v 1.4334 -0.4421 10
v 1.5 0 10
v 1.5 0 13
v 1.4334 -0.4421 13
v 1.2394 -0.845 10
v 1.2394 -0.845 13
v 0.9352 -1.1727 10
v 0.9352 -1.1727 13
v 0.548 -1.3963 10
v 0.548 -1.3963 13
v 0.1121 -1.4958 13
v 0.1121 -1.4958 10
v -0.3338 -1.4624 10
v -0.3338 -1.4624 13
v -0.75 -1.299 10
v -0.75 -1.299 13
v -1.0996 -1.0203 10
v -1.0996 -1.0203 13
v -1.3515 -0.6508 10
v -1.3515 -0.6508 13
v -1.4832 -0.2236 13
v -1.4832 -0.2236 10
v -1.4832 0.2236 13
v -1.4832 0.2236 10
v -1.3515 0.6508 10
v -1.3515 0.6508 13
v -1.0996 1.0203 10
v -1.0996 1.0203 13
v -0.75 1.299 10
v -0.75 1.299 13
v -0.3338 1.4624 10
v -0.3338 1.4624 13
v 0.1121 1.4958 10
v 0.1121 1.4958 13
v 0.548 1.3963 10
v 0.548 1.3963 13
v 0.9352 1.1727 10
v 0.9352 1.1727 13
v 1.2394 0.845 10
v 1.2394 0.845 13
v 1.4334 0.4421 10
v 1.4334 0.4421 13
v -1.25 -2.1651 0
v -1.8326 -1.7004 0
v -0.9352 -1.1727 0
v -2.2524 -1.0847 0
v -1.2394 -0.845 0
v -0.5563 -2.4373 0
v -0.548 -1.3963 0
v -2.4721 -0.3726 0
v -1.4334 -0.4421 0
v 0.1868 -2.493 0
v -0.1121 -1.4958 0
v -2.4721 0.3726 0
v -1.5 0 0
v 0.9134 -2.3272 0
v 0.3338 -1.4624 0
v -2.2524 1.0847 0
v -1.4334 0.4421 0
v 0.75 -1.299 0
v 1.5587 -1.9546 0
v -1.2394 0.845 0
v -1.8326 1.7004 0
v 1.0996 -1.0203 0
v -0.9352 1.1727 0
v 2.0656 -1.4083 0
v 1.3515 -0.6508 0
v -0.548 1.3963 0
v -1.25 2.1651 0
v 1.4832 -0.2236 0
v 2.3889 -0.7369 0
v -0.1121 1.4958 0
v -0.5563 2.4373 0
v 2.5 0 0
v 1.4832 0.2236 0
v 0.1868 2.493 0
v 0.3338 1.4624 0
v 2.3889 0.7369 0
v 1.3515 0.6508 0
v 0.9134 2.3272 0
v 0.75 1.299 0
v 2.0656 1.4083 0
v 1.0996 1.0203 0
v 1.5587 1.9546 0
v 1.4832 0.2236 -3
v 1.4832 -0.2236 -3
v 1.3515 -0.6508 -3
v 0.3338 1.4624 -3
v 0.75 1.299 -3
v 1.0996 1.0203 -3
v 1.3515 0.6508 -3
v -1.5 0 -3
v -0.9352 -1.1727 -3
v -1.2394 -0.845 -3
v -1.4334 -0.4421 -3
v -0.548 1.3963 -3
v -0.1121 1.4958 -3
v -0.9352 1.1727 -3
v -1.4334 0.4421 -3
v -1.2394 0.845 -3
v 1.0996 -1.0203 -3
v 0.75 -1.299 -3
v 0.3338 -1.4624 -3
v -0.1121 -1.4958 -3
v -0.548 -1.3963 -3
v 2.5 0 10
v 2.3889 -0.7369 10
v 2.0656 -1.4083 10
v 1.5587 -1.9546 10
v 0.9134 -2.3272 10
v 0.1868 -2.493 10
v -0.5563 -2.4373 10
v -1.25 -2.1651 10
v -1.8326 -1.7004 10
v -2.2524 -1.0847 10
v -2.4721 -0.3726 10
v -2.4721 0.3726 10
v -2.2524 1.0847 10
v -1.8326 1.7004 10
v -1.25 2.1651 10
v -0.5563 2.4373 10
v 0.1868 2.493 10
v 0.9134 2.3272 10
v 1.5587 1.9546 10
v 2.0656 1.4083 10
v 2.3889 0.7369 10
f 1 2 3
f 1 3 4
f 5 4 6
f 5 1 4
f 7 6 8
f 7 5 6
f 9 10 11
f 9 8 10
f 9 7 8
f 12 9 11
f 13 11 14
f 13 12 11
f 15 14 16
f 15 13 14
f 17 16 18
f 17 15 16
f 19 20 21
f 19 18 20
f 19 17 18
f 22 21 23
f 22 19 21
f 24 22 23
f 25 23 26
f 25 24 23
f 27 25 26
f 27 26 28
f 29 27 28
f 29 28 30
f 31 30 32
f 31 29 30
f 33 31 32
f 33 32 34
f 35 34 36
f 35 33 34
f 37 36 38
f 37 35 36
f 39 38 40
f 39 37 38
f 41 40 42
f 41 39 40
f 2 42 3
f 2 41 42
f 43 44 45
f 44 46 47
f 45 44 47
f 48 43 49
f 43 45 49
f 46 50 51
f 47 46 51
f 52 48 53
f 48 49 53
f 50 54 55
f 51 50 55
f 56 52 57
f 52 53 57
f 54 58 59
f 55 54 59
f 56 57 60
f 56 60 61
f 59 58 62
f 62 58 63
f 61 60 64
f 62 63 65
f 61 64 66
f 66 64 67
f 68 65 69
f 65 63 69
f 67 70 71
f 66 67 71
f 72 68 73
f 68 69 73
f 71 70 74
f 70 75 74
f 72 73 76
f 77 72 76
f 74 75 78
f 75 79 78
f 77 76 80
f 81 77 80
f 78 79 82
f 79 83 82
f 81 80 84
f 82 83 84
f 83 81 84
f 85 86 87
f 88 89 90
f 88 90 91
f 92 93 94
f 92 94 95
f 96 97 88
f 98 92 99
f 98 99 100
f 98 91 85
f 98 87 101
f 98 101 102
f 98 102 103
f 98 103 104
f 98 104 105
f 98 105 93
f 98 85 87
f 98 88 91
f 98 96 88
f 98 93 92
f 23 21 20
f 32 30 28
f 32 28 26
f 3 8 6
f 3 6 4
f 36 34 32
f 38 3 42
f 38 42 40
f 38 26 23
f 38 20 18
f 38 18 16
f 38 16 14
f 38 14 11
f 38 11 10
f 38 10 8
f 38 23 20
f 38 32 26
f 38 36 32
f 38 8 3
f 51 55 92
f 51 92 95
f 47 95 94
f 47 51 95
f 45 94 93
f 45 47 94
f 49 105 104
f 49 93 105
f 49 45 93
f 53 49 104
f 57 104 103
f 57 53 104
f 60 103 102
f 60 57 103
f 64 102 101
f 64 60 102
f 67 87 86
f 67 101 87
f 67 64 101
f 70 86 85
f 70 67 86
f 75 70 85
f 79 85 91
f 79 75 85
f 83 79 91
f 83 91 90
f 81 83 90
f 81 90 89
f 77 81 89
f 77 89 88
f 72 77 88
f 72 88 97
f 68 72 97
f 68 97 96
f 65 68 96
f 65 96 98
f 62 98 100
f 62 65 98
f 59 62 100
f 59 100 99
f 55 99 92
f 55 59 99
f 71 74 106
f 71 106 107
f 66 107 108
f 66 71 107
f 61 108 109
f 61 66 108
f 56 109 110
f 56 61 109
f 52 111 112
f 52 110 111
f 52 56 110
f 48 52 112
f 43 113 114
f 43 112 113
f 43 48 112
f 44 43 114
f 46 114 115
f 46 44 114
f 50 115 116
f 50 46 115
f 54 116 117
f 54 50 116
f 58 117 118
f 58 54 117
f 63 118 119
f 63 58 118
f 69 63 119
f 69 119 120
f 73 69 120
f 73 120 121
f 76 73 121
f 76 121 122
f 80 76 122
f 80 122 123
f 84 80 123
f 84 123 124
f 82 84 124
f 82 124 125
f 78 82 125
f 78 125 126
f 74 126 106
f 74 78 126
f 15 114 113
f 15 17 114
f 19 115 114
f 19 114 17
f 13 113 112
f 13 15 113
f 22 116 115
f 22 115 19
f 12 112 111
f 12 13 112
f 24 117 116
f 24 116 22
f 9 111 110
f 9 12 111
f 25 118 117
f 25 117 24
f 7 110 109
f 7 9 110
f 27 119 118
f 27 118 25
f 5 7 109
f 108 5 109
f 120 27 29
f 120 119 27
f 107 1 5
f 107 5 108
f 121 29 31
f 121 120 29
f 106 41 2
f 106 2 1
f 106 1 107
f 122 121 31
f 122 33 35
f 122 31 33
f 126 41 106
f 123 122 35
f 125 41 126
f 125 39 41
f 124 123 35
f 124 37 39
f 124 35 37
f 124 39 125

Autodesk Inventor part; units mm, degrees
ref_plane "YZ Plane" through (0, 0, 0) normal (1, 0, 0) x (0, 1, 0)
ref_plane "XZ Plane" through (0, 0, 0) normal (0, 1, 0) x (-1, 0, 0)
ref_plane "XY Plane" through (0, 0, 0) normal (0, 0, 1) x (1, 0, 0)
sketch "Sketch1" plane through (0, 0, 0) normal (0, 0, 1) x (1, 0, 0)
  circle A0 centre (0, 0) radius 2.5
  dimension "d0" = 5
extrude "Extrusion1" add sketch "Sketch1" along normal blind 10
sketch "Sketch2" plane through (0, 0, 10) normal (0, 0, 1) x (1, 0, 0)
  circle A0 centre (0, 0) radius 2.5 projected
  circle A1 centre (0, 0) radius 1.5
  dimension "d3" = 3
extrude "Extrusion2" add sketch "Sketch2" along normal blind 3 contours A1
thread "Thread1" size "M3x0.5" class "6g" standard "ANSI Metric M Profile" full length
sketch "Sketch3" plane through (0, 0, 0) normal (0, 0, -1) x (-1, 0, 0)
  circle A0 centre (0, 0) radius 2.5 projected
  circle A1 centre (0, 0) radius 1.5
  dimension "d8" = 3
extrude "Extrusion3" add sketch "Sketch3" along normal blind 3 contours A1
thread "Thread2" size "M3x0.5" class "6g" standard "ANSI Metric M Profile" full length
properties part number "spacer 1 cm"
